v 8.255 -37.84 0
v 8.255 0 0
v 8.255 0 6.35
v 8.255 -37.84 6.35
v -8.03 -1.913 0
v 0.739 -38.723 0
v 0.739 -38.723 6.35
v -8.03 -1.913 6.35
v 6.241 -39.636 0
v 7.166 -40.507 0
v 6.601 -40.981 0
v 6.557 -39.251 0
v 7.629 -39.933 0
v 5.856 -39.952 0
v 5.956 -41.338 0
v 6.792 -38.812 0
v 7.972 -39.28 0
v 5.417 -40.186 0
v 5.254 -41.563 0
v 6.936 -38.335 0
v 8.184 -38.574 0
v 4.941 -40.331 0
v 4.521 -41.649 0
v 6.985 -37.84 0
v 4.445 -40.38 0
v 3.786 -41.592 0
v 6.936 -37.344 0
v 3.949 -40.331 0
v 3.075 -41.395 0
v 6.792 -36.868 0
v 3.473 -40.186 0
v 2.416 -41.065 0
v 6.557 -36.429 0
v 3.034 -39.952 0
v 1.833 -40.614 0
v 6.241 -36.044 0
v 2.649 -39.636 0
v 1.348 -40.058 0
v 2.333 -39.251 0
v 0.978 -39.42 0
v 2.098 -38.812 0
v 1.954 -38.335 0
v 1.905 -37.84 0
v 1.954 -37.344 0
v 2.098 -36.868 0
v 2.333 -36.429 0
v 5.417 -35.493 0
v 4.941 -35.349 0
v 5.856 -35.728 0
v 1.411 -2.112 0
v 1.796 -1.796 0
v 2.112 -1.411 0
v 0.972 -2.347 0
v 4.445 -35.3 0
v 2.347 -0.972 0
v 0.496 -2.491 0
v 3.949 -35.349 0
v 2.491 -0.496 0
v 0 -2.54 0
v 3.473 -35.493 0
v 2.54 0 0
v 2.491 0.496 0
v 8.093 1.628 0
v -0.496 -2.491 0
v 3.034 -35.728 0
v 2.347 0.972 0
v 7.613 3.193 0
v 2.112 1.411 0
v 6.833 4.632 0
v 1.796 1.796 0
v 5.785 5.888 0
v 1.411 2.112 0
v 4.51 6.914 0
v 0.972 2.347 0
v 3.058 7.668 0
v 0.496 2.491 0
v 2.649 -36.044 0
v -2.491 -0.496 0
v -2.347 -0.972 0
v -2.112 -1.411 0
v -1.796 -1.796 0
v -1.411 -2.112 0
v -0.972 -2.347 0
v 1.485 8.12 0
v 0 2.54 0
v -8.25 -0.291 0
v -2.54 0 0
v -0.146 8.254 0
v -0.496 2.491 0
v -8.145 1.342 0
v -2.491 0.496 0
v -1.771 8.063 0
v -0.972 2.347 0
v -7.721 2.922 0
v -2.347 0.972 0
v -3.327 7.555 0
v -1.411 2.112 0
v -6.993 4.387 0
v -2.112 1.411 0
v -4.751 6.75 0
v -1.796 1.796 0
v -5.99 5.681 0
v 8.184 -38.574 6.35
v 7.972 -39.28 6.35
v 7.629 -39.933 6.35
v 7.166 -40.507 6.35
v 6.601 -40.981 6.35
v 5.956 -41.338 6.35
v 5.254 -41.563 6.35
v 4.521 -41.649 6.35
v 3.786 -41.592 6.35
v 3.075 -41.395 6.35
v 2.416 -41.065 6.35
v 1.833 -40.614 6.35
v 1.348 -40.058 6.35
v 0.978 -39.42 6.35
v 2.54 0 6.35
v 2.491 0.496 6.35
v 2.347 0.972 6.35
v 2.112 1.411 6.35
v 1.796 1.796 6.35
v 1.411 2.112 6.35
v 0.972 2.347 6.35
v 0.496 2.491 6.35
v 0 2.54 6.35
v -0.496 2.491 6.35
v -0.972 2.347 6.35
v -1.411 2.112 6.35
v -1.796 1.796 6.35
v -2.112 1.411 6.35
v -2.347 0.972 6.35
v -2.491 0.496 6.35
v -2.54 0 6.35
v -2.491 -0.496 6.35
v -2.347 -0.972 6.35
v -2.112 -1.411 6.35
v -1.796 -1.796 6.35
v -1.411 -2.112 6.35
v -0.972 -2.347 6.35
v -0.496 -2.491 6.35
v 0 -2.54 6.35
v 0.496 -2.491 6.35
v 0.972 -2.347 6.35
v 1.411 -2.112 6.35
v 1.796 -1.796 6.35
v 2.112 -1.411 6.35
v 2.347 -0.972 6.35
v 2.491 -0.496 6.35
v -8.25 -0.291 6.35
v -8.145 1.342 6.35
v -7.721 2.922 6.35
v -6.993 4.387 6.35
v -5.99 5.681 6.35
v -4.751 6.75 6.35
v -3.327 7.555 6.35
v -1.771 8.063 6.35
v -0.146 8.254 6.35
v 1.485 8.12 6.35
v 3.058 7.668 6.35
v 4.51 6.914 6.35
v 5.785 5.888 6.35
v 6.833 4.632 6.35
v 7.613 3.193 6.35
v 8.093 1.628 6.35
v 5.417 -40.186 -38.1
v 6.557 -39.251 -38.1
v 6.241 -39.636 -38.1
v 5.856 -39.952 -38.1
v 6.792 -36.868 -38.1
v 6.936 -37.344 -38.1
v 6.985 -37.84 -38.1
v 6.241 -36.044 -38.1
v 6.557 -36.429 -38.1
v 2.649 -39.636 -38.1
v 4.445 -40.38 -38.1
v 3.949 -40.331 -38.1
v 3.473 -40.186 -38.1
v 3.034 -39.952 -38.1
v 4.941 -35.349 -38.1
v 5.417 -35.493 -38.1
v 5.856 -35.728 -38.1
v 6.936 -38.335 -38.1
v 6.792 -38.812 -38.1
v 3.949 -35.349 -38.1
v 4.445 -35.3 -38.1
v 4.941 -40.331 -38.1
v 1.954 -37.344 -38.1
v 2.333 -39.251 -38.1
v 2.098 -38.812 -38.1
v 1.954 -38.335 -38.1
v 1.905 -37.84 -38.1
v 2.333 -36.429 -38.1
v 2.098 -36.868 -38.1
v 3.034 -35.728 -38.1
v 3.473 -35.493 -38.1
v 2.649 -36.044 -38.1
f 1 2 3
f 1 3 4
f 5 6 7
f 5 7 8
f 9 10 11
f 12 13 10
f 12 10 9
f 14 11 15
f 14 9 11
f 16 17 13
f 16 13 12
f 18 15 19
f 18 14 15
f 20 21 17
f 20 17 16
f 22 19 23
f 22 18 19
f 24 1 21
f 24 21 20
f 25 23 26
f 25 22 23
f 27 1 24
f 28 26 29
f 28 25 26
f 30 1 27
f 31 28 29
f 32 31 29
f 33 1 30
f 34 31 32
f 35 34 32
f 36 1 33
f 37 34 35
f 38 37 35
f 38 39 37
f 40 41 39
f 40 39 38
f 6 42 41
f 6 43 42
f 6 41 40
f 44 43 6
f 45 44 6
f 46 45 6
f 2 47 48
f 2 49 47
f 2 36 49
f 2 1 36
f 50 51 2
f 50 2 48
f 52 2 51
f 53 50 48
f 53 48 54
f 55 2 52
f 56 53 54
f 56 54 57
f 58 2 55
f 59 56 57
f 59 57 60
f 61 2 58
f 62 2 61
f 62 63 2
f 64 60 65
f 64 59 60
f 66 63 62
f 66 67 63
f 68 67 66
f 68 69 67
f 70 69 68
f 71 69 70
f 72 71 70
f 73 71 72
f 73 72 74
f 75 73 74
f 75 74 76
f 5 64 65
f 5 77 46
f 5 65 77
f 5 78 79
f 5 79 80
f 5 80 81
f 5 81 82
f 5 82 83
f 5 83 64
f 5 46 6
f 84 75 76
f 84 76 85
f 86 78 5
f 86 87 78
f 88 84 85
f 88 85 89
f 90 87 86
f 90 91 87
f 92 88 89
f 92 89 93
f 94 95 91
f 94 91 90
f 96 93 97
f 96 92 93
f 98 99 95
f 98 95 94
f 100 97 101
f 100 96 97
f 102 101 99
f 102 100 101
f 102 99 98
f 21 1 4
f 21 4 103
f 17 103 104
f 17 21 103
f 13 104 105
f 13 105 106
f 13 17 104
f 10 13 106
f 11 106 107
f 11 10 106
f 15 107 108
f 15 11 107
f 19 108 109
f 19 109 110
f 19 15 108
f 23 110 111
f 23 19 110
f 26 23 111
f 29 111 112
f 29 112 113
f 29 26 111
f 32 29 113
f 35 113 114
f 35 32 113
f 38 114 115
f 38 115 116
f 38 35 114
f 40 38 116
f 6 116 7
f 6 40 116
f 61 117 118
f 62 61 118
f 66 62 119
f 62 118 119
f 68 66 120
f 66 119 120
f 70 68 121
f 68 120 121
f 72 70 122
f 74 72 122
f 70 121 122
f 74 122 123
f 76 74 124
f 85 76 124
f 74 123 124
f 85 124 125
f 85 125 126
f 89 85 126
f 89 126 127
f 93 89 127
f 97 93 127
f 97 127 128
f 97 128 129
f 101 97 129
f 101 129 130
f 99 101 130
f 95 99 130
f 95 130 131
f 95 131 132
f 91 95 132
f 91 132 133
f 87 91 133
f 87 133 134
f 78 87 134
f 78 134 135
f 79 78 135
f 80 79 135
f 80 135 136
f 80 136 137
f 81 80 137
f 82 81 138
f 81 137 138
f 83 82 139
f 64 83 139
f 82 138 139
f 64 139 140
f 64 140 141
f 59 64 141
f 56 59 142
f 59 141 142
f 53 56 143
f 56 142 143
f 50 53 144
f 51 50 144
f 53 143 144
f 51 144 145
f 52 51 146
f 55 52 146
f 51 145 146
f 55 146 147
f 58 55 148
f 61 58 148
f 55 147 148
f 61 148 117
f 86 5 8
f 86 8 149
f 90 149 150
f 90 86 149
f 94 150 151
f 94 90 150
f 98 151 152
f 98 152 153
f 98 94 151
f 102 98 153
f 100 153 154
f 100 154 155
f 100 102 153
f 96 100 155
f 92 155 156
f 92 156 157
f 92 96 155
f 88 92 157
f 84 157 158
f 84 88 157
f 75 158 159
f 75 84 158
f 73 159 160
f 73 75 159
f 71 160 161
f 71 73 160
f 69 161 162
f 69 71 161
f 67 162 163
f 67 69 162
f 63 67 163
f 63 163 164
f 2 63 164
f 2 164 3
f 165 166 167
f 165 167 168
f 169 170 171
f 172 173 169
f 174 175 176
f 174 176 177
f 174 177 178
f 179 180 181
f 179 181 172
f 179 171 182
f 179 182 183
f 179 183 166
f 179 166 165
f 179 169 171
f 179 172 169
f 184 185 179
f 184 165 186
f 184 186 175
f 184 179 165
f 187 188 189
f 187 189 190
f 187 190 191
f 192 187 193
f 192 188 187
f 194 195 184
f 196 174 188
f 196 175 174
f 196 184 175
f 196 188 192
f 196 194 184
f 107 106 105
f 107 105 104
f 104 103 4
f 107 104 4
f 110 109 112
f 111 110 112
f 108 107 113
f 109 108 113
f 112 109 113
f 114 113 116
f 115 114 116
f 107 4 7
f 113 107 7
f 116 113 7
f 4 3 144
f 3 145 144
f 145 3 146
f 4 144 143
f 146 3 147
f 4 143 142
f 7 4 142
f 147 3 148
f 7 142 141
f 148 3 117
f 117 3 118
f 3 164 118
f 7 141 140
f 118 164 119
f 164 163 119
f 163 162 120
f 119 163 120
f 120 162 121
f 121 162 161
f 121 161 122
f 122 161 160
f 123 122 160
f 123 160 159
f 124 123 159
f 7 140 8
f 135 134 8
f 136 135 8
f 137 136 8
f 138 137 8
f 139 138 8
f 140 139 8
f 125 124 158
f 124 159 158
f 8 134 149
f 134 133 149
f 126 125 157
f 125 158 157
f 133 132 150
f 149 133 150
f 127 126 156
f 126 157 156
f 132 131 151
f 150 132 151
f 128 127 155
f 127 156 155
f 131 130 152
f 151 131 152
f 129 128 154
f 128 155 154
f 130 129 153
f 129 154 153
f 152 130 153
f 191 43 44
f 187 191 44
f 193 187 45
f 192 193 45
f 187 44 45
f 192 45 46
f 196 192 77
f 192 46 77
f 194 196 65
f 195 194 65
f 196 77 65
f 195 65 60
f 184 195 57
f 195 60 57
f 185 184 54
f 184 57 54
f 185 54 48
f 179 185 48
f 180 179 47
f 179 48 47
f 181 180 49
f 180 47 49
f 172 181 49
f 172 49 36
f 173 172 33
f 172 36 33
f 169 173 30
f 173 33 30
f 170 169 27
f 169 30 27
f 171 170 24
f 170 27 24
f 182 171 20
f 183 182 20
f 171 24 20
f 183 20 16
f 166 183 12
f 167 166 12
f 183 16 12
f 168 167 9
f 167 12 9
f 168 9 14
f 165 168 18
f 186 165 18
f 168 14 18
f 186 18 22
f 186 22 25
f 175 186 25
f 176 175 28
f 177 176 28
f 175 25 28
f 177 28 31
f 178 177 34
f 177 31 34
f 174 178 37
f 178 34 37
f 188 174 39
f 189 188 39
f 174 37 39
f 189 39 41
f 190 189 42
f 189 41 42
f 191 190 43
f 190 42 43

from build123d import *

# Parameters (mm, degrees)
BOSS_EXTRUDE1_DEPTH = 6.35
SKETCH2_R           = 2.54
BOSS_EXTRUDE2_DEPTH = 38.1
SKETCH3_R           = 2.54
CUT_EXTRUDE1_DEPTH  = 38.1


with BuildPart() as part:
    # Sketch1 → Boss-Extrude1 (new body)
    with BuildSketch(Plane.XY):
        with BuildLine():
            Line((8.255, 0), (8.255, -37.839819965))
            ThreePointArc((8.255, -37.839819965), (4.8895, -41.623801962), (0.738716667, -38.722749098))
            Line((0.738716667, -38.722749098), (-8.030280556, -1.91301312))
            ThreePointArc((-8.030280556, -1.91301312), (-0.963083333, 8.198627659), (8.255, 0))
        make_face()
    extrude(amount=BOSS_EXTRUDE1_DEPTH)

    # Sketch2 → Boss-Extrude2 (add)
    with BuildSketch(Plane(origin=(0, 0, 0), x_dir=(-1, 0, 0), z_dir=(0, 0, -1))):
        with Locations((-4.445, -37.839819965)):
            Circle(SKETCH2_R)
    extrude(amount=BOSS_EXTRUDE2_DEPTH)

    # Sketch3 → Cut-Extrude1 (cut)
    with BuildSketch(Plane.XY.offset(6.35)):
        Circle(SKETCH3_R)
    extrude(amount=-CUT_EXTRUDE1_DEPTH, mode=Mode.SUBTRACT)


solid = part.part
